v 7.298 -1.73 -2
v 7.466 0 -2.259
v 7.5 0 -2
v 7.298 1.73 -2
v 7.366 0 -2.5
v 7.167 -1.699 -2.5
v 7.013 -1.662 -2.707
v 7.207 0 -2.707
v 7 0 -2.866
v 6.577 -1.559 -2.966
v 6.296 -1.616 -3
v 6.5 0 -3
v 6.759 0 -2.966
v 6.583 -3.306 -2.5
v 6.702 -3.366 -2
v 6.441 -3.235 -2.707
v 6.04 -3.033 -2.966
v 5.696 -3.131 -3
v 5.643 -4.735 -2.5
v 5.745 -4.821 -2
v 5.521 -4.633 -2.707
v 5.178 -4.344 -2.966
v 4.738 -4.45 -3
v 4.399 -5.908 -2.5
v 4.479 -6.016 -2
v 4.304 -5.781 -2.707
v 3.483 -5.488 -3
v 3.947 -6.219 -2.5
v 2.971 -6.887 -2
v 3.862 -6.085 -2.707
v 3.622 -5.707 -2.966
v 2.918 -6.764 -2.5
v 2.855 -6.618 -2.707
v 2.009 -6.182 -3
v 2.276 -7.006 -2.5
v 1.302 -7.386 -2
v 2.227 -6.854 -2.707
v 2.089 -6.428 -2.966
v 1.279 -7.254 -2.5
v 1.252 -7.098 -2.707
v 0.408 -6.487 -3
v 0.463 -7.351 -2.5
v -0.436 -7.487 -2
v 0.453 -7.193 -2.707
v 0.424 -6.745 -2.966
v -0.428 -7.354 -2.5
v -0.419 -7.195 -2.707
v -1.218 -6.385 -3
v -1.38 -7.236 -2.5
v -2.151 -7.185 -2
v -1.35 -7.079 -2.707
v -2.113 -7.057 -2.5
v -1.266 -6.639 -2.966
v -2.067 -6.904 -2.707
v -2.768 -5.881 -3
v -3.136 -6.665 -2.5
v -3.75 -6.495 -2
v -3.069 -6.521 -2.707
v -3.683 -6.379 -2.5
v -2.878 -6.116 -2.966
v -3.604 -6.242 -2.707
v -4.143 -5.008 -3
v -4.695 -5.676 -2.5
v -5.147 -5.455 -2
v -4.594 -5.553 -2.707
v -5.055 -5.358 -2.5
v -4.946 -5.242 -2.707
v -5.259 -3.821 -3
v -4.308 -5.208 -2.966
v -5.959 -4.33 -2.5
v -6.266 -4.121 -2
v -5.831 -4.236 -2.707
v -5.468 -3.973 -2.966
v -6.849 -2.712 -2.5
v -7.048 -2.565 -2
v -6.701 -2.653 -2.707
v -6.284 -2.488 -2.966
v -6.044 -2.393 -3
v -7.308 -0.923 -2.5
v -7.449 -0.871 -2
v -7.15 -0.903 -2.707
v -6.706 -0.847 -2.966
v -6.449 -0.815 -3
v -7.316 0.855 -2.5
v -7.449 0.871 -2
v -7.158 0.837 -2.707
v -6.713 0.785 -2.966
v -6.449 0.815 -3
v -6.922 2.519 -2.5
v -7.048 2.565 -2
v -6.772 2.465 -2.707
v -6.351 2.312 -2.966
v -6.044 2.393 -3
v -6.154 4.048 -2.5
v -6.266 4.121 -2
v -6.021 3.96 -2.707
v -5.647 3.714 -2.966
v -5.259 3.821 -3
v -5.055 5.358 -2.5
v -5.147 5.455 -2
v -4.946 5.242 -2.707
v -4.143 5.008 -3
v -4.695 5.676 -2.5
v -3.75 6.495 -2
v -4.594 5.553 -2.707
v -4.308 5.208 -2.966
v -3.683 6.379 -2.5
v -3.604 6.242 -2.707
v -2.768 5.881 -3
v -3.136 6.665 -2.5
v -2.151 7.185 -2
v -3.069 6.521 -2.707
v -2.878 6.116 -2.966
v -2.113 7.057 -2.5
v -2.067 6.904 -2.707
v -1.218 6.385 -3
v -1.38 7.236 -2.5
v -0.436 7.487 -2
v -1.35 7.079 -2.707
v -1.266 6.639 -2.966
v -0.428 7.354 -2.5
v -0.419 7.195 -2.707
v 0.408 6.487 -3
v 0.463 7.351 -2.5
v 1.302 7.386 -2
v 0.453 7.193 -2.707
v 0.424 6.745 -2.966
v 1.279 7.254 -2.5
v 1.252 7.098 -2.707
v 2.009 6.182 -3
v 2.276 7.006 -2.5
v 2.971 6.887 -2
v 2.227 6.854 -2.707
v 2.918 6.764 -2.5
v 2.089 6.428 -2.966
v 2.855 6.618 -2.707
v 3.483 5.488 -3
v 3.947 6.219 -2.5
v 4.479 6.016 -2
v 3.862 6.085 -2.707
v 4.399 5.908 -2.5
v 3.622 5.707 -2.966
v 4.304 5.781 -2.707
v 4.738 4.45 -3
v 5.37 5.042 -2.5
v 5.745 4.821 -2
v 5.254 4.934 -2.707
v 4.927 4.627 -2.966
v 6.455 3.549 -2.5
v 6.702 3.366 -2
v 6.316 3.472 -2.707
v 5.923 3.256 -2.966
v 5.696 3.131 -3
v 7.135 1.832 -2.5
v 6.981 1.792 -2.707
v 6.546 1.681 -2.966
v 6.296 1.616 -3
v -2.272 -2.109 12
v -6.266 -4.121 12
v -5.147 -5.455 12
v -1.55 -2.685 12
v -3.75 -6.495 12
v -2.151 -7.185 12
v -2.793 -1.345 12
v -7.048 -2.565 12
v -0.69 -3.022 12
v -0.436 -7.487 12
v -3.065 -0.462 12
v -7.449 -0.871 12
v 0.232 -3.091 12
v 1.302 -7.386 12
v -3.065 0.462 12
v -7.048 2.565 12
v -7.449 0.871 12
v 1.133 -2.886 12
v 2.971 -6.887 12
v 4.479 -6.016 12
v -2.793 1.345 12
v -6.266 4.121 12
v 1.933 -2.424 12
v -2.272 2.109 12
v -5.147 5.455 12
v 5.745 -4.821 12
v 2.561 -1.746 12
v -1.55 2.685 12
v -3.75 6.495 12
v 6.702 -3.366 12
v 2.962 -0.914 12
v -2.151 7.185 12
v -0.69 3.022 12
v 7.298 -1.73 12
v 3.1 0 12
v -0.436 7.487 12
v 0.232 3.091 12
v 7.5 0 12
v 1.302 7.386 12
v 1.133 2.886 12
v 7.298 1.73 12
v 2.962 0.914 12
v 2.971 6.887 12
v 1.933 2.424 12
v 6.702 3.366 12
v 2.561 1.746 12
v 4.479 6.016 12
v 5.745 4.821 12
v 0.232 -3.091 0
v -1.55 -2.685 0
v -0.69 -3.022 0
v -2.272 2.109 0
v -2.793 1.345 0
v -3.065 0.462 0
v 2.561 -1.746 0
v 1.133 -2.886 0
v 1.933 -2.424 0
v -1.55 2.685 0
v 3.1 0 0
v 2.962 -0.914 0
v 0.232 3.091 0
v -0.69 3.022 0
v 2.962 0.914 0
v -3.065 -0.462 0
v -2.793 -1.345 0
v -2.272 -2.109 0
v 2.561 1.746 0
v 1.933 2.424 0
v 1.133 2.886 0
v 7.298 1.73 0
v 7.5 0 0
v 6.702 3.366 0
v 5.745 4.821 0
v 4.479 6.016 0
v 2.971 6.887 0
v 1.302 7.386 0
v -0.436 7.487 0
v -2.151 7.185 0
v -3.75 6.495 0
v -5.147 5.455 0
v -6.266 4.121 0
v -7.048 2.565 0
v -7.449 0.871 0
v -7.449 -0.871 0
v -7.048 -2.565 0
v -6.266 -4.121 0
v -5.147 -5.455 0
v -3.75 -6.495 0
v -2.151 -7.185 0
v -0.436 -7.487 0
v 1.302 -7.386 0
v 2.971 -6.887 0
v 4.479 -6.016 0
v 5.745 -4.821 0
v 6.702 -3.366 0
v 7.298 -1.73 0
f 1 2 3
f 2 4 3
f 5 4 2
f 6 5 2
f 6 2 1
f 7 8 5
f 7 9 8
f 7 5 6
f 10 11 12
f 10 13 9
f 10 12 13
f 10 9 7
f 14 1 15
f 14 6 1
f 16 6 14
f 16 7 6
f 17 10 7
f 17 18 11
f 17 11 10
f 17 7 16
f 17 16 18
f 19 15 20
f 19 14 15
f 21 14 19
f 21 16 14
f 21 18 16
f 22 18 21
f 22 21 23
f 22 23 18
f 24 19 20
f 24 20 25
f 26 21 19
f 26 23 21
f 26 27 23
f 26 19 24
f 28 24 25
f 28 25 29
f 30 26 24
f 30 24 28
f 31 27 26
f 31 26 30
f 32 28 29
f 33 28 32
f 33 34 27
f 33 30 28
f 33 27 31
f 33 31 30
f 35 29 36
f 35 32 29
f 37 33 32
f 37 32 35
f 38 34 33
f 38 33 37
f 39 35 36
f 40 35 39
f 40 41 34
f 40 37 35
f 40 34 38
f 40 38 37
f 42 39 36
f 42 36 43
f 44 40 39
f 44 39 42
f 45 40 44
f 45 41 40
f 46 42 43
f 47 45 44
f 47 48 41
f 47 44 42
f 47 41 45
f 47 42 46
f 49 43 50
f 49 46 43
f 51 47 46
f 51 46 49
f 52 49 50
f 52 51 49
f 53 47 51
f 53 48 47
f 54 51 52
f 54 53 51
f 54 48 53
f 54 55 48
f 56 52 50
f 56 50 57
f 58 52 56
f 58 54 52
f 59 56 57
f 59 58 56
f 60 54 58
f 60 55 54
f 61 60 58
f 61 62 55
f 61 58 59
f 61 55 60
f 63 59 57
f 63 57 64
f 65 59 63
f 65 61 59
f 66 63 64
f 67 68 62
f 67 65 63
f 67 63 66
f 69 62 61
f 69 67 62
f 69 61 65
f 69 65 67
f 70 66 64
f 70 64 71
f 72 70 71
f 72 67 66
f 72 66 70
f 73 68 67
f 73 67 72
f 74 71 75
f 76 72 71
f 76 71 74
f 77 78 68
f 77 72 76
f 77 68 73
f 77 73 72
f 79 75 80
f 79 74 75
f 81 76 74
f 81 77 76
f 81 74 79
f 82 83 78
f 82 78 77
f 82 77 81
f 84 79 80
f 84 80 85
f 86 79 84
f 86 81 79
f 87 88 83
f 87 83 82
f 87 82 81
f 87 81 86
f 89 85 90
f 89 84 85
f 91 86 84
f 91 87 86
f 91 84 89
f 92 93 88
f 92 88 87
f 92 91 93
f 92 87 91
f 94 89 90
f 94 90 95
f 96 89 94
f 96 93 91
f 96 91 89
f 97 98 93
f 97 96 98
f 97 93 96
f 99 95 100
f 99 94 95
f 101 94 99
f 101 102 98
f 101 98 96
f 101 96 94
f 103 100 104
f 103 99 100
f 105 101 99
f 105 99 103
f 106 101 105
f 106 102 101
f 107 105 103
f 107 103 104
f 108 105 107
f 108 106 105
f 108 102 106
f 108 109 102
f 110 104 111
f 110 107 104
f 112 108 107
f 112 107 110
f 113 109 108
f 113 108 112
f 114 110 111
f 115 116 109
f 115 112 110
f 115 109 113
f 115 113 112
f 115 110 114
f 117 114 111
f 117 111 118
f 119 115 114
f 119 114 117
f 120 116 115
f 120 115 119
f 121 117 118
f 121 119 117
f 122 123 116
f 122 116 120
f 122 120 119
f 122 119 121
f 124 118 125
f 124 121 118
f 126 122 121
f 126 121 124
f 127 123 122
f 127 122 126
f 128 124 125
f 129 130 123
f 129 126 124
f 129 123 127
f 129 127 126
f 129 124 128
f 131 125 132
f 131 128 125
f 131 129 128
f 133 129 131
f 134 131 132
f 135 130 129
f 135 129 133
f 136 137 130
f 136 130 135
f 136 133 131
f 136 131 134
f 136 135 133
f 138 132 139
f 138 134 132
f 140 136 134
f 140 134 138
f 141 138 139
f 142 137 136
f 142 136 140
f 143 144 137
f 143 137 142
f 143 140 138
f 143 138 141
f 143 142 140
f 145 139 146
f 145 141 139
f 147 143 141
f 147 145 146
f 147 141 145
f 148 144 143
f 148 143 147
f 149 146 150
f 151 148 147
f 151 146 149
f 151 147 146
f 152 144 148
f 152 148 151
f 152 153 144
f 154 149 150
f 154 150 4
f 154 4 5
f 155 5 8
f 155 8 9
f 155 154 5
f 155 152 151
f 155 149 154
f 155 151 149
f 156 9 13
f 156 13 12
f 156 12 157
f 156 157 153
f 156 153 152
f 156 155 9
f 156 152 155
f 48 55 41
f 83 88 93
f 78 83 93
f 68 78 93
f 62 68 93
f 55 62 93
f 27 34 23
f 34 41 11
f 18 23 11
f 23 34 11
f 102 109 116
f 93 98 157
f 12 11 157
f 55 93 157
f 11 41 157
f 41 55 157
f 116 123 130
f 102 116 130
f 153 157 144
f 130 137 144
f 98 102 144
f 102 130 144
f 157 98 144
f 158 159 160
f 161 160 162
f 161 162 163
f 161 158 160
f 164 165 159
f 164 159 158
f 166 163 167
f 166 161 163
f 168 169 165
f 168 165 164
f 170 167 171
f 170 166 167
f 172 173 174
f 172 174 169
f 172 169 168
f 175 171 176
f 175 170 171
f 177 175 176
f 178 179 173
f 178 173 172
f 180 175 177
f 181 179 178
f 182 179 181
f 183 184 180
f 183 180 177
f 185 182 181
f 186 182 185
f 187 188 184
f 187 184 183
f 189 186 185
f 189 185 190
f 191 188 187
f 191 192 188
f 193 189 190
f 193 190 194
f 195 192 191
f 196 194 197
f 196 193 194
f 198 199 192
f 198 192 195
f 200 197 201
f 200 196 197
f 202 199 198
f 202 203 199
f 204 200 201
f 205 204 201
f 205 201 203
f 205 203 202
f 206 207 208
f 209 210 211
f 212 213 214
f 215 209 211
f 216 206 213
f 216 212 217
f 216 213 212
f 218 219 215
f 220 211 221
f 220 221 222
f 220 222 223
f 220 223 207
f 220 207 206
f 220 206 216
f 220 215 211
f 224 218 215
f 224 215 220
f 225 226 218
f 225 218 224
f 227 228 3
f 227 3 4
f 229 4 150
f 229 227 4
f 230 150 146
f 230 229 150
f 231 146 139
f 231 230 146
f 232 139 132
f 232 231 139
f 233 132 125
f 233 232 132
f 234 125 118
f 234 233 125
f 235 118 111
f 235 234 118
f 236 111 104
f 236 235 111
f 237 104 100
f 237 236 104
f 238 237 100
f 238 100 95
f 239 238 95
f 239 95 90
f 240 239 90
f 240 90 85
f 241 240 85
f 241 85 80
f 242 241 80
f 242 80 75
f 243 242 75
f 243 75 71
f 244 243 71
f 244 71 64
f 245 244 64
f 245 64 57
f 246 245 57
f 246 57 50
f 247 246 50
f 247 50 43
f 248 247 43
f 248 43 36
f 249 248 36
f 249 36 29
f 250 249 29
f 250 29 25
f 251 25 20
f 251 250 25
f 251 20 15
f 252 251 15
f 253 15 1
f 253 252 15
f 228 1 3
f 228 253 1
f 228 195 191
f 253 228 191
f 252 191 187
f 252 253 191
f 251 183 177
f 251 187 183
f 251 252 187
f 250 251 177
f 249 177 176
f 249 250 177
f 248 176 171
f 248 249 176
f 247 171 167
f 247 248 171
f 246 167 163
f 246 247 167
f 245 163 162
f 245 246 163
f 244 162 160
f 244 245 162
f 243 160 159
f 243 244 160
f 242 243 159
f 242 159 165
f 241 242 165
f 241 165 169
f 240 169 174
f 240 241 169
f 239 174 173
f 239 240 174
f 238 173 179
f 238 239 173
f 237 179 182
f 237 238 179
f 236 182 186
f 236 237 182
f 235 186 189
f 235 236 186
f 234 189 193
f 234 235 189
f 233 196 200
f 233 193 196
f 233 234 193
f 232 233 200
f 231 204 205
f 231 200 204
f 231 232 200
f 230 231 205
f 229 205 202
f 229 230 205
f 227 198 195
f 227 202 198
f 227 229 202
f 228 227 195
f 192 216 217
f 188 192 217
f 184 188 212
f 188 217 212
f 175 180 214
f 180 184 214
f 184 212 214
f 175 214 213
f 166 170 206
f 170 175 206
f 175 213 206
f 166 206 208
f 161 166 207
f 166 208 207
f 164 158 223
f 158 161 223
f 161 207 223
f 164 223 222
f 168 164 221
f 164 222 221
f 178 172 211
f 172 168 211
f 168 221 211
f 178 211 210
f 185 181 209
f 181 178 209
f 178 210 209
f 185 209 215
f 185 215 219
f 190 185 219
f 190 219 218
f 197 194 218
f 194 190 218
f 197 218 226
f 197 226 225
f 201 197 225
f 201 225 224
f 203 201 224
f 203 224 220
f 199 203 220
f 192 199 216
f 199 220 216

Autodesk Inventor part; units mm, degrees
ref_plane "YZ Plane" through (0, 0, 0) normal (1, 0, 0) x (0, 1, 0)
ref_plane "XZ Plane" through (0, 0, 0) normal (0, 1, 0) x (-1, 0, 0)
ref_plane "XY Plane" through (0, 0, 0) normal (0, 0, 1) x (1, 0, 0)
sketch "Skizze1" plane through (0, 0, 0) normal (0, 0, 1) x (1, 0, 0)
  circle A0 centre (0, 0) radius 3.1
  circle A1 centre (0, 0) radius 7.5
  dimension "d0" = 6.2
  dimension "d1" = 15
extrude "Extrusion1" add sketch "Skizze1" along normal blind 12
extrude "Extrusion2" add sketch "Skizze1" against normal blind 3 contours A0 | A1
fillet "Rundung1" radius 1 1 edges at (-7.5, 0, -3)
properties part number "Knopf"
